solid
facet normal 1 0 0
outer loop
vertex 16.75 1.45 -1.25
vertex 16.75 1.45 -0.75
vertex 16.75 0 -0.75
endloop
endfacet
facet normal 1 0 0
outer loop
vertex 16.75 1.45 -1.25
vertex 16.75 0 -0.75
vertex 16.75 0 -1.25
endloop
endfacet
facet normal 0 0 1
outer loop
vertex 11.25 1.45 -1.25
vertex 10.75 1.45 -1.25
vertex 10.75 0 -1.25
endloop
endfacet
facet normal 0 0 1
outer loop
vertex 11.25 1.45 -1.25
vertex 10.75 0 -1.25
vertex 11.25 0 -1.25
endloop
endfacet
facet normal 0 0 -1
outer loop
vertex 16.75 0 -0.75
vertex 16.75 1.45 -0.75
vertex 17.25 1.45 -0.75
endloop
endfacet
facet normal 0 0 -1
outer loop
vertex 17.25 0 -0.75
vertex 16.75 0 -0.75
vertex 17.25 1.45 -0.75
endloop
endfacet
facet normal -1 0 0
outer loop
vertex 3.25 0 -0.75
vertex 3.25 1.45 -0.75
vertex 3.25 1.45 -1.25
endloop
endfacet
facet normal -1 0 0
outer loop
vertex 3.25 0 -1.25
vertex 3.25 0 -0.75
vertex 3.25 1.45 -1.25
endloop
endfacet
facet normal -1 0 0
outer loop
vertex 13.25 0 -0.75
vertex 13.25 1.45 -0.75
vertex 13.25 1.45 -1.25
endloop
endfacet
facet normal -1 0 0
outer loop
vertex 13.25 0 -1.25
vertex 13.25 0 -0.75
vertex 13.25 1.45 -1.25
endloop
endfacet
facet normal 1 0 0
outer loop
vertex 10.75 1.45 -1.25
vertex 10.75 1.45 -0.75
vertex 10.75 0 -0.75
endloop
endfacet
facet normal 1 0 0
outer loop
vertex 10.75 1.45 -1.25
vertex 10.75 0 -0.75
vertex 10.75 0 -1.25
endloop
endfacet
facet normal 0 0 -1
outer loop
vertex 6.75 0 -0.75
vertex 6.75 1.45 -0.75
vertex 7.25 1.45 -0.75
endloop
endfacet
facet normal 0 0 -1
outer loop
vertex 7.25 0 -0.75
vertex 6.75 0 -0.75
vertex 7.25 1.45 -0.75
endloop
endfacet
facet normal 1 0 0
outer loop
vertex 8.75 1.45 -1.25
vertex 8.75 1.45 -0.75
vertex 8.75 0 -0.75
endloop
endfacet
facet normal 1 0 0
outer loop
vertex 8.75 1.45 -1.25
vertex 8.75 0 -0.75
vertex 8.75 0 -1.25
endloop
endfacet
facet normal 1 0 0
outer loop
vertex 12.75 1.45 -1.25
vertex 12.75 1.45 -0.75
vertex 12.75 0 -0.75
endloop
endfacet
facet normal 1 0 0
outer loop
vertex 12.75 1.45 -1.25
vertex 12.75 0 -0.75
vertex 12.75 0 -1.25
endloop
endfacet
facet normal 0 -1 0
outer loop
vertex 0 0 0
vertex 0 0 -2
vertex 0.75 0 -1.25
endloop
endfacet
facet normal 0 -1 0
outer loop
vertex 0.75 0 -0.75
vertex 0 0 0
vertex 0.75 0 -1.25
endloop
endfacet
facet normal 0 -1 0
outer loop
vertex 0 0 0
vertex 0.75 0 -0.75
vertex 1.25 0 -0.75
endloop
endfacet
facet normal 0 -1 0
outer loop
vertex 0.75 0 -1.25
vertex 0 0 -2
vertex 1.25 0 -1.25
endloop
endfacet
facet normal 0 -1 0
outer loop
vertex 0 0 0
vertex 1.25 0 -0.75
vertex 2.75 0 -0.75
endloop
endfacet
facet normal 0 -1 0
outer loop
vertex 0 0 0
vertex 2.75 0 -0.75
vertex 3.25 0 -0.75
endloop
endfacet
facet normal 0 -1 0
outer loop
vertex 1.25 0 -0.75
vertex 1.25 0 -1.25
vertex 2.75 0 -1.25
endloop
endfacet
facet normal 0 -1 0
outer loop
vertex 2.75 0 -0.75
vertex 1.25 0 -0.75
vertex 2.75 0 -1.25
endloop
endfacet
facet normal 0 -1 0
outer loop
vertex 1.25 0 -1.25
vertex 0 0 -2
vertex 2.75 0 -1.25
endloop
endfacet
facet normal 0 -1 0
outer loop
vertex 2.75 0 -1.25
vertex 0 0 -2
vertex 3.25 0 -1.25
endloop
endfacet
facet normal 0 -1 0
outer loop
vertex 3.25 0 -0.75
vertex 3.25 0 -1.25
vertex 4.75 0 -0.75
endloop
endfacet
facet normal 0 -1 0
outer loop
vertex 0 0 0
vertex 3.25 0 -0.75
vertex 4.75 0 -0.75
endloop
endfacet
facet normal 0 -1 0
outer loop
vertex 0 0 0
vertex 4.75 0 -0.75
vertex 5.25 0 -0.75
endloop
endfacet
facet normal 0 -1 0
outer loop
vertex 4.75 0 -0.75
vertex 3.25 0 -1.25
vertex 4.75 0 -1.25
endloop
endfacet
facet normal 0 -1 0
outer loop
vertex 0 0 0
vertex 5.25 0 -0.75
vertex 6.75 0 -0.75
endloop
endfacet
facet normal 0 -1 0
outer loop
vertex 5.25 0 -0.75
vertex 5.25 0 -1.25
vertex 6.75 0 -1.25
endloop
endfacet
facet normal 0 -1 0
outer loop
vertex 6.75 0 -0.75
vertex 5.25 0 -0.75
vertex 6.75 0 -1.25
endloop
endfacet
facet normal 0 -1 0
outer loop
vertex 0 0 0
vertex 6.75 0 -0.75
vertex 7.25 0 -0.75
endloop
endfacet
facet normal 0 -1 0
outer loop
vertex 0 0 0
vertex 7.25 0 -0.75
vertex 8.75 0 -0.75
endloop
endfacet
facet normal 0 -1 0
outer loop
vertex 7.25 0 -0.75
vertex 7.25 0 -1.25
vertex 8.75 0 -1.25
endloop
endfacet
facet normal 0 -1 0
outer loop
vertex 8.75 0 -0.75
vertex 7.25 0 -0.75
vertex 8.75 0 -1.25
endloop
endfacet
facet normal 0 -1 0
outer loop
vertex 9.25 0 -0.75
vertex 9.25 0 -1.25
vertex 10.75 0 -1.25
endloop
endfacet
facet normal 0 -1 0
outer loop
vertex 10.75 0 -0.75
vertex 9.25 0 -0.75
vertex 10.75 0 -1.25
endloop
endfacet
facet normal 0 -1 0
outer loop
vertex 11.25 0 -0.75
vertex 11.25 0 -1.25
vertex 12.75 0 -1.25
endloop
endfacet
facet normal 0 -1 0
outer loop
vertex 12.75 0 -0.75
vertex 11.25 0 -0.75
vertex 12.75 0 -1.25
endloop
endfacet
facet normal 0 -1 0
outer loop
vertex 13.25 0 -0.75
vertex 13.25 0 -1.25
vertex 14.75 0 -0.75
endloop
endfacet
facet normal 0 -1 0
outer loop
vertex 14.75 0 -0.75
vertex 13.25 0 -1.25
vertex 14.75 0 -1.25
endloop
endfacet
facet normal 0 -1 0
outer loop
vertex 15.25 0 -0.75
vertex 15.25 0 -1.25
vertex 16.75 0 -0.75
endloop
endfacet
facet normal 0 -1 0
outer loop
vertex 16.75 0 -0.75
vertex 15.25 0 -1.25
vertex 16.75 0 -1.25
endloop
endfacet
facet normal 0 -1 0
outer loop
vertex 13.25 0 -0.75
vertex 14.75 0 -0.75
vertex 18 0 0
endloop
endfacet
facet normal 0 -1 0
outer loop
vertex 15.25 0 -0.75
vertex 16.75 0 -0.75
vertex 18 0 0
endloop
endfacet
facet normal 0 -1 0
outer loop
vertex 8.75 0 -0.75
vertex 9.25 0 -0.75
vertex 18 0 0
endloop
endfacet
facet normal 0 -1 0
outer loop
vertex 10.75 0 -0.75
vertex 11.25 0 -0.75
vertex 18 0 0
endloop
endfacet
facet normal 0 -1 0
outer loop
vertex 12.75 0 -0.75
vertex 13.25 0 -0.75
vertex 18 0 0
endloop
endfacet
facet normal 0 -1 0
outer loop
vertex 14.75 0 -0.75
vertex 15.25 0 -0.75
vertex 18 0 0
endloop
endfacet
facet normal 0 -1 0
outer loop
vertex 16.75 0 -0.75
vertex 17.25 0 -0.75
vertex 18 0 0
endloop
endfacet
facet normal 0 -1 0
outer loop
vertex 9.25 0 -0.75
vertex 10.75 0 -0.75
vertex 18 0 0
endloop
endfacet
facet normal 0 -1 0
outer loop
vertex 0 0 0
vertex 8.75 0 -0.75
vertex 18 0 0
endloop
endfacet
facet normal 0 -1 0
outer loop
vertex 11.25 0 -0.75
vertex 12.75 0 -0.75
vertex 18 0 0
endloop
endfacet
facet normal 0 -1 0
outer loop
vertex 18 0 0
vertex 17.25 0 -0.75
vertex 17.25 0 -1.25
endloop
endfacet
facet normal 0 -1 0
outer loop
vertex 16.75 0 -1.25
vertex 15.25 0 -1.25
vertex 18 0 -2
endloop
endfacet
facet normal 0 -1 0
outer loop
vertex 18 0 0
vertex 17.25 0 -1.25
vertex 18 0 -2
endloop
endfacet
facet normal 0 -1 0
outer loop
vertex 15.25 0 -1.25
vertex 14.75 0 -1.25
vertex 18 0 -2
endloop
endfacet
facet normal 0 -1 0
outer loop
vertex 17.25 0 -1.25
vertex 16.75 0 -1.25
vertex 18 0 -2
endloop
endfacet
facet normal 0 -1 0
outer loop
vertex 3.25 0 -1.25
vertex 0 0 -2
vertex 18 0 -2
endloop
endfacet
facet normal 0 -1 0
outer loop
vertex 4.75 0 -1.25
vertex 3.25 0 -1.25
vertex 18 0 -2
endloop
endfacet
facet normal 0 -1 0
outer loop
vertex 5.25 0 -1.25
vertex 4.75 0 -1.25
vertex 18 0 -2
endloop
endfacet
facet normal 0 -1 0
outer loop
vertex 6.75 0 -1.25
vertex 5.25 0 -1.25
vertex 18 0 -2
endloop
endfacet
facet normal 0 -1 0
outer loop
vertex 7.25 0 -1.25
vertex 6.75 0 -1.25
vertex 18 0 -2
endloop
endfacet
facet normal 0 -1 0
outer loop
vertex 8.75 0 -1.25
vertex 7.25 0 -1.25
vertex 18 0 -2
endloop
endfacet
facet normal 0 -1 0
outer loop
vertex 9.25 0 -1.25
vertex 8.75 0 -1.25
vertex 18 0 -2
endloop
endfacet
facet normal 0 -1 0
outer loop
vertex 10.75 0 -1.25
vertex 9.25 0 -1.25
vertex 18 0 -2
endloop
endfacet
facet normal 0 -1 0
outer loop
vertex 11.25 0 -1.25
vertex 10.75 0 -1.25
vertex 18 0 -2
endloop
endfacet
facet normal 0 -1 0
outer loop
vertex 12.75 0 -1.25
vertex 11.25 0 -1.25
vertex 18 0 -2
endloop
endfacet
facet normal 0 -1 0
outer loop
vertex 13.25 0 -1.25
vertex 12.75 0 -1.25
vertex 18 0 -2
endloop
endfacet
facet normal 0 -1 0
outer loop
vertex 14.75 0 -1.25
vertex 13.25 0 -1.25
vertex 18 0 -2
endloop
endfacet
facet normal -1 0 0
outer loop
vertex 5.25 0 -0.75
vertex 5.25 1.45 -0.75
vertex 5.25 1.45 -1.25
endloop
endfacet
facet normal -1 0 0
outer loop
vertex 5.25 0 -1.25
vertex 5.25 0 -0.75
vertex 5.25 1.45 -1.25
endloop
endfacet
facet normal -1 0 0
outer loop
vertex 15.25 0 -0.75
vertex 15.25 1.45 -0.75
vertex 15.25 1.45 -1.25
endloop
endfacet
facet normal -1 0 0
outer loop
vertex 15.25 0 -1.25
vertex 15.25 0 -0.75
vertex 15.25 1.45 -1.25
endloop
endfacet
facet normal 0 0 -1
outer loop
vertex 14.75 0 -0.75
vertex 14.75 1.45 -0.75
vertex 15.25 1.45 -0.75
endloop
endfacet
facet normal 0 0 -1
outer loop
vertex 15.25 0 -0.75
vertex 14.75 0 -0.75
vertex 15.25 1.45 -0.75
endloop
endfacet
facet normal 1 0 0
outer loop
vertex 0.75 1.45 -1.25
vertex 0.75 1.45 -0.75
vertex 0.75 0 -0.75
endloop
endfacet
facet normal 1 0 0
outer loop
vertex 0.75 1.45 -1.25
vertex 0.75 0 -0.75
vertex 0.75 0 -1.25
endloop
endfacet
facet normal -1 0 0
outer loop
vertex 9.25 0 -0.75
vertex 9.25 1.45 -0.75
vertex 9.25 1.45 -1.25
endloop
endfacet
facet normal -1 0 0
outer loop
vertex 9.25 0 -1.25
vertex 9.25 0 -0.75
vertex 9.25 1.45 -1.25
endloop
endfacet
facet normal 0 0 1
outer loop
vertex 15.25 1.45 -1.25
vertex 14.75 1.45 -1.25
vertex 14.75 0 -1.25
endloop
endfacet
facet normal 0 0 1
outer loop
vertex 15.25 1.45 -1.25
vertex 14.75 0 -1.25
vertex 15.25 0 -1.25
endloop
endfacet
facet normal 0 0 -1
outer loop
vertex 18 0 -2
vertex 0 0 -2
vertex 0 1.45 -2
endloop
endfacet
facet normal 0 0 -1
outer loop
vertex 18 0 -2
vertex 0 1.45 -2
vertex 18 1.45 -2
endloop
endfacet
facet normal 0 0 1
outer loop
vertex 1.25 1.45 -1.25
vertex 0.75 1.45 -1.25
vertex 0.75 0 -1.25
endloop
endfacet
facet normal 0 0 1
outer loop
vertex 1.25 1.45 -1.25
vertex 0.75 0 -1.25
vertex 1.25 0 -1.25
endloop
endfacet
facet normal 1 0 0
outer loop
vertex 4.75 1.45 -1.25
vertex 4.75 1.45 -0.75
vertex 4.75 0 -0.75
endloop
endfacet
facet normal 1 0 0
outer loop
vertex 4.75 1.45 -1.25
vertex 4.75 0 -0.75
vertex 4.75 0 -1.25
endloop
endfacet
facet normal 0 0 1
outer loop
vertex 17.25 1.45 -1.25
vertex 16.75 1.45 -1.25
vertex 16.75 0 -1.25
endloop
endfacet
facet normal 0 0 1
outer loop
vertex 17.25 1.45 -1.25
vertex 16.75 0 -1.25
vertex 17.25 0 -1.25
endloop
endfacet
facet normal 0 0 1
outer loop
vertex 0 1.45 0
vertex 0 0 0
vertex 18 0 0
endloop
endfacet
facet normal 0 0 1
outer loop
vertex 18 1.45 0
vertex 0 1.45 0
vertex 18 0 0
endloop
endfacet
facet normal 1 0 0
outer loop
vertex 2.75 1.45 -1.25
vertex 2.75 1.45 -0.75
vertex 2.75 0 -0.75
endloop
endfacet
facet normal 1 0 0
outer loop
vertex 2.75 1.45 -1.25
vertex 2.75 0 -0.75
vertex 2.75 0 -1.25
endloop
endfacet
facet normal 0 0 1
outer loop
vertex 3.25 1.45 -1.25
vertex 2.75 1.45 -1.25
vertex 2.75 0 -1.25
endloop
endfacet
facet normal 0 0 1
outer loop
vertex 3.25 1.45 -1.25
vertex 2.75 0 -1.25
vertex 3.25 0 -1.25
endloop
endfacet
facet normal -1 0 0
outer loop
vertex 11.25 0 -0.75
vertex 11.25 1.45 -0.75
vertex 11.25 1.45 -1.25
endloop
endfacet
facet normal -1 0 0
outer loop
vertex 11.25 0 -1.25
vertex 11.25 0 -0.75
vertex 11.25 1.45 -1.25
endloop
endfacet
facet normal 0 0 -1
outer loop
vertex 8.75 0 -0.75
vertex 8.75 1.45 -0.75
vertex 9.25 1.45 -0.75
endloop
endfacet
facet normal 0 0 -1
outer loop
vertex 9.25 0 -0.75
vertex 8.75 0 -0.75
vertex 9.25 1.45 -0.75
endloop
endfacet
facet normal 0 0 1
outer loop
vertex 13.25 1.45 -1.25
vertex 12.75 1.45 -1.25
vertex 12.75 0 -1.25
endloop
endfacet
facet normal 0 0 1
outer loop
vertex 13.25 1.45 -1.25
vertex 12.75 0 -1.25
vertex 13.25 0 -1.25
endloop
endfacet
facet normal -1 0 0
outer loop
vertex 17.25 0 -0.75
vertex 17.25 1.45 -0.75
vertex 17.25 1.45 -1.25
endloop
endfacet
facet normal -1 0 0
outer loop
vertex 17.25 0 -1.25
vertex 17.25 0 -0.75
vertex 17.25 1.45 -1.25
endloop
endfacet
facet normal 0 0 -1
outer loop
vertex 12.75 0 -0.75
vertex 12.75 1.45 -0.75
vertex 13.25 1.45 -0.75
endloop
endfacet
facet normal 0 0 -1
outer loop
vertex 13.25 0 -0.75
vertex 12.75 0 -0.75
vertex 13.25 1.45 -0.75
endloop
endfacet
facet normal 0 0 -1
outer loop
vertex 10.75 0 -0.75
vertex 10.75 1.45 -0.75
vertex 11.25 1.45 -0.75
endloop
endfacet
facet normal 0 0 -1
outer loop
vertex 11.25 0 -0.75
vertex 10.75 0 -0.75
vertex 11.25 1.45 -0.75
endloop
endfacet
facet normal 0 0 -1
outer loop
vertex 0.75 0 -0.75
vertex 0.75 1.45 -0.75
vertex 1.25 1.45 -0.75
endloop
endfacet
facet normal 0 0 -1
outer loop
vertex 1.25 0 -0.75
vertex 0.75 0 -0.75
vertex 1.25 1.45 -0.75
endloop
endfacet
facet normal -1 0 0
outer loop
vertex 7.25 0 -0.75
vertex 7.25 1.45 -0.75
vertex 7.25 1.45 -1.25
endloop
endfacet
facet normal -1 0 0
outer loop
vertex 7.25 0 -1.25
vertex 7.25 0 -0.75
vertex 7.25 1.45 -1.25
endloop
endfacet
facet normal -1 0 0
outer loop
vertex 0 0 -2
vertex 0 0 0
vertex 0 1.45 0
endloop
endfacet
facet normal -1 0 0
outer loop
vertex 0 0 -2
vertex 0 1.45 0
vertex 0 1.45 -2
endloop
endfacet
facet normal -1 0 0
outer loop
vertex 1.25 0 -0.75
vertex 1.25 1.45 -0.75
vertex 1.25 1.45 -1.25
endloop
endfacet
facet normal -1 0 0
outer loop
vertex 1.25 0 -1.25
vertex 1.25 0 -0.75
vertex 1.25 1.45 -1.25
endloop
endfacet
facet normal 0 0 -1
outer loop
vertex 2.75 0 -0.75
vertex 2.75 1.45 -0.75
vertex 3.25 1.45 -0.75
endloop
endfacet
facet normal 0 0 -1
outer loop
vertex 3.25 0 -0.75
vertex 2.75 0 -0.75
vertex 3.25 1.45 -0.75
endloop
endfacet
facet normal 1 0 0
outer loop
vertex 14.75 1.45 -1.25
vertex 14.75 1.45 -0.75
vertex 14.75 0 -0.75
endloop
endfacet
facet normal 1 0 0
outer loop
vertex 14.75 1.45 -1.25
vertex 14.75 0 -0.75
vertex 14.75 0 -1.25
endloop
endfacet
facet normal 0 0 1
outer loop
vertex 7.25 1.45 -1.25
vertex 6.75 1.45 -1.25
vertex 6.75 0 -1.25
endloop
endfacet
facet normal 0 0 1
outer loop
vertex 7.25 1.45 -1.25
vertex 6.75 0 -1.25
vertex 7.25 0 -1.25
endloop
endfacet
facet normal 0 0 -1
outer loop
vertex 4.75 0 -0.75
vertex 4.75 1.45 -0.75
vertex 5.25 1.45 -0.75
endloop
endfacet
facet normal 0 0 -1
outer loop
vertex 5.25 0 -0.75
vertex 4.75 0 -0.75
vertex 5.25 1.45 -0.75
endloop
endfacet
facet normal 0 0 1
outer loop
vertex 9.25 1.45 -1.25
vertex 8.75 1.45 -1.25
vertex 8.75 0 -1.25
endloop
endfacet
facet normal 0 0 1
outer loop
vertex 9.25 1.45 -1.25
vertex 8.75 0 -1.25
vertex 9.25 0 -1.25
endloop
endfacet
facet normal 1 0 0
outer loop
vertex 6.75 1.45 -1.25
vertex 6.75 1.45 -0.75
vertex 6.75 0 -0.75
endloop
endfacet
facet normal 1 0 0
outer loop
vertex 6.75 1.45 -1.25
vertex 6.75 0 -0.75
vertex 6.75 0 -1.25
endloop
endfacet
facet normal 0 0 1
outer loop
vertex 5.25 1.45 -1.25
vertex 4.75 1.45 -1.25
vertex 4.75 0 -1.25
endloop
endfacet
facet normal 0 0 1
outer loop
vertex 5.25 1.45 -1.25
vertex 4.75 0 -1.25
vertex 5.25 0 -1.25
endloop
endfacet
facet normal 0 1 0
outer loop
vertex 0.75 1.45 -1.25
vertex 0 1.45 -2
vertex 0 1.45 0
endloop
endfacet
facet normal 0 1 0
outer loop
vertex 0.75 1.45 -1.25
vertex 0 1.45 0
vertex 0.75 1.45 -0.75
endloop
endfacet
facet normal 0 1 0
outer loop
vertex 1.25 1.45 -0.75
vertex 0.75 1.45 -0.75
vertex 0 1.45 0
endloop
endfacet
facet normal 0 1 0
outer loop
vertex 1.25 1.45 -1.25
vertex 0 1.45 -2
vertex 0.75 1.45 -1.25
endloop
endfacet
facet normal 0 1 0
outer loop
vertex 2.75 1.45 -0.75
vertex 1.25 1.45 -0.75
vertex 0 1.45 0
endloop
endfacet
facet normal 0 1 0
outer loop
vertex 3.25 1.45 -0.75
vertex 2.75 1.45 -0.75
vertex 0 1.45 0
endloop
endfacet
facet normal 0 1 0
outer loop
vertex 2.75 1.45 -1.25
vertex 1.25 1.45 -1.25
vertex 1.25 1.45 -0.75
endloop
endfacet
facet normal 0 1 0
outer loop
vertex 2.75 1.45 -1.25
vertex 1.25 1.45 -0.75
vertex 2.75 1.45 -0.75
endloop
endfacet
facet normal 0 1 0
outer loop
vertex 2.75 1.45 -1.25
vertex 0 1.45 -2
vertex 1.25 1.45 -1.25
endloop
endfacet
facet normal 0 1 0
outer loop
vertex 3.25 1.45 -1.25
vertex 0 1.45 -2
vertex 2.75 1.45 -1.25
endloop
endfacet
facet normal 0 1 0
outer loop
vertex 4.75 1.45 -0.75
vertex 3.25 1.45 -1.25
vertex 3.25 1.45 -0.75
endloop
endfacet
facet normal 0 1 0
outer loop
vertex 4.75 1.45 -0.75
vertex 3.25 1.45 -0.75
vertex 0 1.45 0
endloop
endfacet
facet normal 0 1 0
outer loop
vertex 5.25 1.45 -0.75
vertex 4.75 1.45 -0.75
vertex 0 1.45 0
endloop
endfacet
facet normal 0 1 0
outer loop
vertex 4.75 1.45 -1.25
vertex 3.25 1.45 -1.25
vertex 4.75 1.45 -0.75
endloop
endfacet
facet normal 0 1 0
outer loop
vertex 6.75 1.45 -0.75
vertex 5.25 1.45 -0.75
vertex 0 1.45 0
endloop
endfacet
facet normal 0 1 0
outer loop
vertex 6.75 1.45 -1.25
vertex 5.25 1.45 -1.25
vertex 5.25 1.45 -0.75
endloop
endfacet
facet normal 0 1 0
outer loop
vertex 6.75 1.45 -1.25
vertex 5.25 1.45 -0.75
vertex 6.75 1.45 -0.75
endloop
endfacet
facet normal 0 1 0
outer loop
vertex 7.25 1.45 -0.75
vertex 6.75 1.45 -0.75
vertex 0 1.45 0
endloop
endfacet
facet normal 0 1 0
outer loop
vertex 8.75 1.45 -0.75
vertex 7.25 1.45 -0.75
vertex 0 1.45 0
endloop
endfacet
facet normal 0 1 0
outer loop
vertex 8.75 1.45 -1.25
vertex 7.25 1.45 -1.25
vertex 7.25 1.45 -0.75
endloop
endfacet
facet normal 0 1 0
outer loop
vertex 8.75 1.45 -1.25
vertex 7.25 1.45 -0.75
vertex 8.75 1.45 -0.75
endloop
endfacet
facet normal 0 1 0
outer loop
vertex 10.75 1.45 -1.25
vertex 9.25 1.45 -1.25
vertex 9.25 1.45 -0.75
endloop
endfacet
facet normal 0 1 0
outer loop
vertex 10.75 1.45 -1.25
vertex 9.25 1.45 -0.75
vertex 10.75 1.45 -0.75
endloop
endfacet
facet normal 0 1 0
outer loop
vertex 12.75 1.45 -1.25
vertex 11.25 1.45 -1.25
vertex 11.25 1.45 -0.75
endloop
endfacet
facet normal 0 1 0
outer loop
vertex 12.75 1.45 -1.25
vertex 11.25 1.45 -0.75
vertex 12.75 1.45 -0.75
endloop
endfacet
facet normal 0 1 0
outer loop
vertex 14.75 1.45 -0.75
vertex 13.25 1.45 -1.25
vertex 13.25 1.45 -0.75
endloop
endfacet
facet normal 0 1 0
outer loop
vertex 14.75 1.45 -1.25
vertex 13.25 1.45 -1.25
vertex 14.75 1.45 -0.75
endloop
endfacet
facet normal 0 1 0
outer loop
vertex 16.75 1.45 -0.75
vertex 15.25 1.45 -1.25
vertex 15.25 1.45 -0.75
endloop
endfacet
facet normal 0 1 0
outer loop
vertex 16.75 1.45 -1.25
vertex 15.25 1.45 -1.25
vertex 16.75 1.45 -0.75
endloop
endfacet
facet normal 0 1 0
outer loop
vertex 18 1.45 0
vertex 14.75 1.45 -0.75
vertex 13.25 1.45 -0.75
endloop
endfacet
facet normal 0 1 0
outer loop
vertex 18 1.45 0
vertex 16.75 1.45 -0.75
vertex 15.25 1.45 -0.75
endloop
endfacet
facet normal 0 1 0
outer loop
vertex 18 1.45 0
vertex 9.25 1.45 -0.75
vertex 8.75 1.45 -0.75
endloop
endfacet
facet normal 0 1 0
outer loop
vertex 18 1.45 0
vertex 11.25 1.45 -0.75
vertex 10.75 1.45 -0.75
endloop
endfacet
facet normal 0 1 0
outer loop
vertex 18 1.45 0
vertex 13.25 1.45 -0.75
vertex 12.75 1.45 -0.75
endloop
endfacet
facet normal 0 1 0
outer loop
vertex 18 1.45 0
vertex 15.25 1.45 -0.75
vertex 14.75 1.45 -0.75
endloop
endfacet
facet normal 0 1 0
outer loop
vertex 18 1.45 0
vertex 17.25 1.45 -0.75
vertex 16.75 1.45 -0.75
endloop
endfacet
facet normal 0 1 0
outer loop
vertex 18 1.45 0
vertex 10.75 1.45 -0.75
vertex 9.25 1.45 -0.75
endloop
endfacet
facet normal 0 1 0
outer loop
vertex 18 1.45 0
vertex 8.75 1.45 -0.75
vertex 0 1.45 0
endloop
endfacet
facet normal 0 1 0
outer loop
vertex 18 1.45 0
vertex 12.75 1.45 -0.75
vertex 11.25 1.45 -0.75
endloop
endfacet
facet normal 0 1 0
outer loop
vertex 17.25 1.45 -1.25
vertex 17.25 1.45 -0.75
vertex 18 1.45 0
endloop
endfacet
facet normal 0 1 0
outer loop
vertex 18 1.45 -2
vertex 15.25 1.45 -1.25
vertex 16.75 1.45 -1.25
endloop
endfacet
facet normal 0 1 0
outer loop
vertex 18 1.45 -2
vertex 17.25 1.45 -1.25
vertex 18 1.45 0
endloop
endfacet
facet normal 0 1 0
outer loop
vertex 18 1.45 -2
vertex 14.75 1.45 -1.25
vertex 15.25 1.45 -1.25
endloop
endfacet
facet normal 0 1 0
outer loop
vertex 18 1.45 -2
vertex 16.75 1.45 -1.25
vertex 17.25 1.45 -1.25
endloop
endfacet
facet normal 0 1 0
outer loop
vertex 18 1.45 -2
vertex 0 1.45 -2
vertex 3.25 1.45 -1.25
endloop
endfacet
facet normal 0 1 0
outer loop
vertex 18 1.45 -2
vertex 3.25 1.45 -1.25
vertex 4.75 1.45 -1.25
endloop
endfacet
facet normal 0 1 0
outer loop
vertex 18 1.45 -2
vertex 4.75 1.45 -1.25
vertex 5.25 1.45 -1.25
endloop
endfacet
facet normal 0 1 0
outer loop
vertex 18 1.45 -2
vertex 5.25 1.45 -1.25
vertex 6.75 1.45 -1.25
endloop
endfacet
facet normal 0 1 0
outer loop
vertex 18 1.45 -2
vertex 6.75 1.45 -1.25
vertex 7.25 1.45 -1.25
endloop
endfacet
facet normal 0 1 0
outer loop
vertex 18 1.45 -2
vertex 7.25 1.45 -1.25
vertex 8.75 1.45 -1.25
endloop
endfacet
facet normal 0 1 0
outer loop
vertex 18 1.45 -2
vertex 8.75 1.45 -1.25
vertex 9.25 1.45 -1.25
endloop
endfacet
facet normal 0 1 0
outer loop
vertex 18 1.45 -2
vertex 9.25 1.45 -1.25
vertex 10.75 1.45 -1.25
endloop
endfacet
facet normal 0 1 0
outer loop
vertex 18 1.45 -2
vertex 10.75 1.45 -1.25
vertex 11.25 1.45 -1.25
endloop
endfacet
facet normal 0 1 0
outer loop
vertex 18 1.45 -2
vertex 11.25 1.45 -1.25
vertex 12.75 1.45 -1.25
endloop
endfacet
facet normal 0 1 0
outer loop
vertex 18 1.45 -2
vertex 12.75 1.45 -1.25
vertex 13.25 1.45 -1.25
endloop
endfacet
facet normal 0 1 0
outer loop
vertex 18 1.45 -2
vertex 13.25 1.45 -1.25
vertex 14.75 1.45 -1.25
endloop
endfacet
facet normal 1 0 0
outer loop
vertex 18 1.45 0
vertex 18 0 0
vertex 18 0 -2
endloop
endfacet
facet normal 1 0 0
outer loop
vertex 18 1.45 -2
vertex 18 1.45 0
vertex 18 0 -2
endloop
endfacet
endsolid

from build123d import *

# Parameters (mm, degrees)
SKETCH1_W           = 18
SKETCH1_H           = 2
BOSS_EXTRUDE1_DEPTH = 1.45
SKETCH2_W           = 0.5
SKETCH2_H           = 0.5
CUT_EXTRUDE1_DEPTH  = 1.45


with BuildPart() as part:
    # Sketch1 → Boss-Extrude1 (new body)
    with BuildSketch(Plane(origin=(0, 0, 0), x_dir=(1, 0, 0), z_dir=(0, 1, 0))):
        with Locations((9, 1)):
            Rectangle(SKETCH1_W, SKETCH1_H)
    extrude(amount=BOSS_EXTRUDE1_DEPTH)

    # Sketch2 → Cut-Extrude1 (cut)
    with BuildSketch(Plane(origin=(0, 1.45, 0), x_dir=(1, 0, 0), z_dir=(0, 1, 0))):
        with Locations((3, 1)):
            Rectangle(SKETCH2_W, SKETCH2_H)
        with Locations((1, 1)):
            Rectangle(SKETCH2_W, SKETCH2_H)
        with Locations((5, 1)):
            Rectangle(SKETCH2_W, SKETCH2_H)
        with Locations((7, 1)):
            Rectangle(SKETCH2_W, SKETCH2_H)
        with Locations((9, 1)):
            Rectangle(SKETCH2_W, SKETCH2_H)
        with Locations((11, 1)):
            Rectangle(SKETCH2_W, SKETCH2_H)
        with Locations((13, 1)):
            Rectangle(SKETCH2_W, SKETCH2_H)
        with Locations((15, 1)):
            Rectangle(SKETCH2_W, SKETCH2_H)
        with Locations((17, 1)):
            Rectangle(SKETCH2_W, SKETCH2_H)
    extrude(amount=-CUT_EXTRUDE1_DEPTH, mode=Mode.SUBTRACT)


solid = part.part
